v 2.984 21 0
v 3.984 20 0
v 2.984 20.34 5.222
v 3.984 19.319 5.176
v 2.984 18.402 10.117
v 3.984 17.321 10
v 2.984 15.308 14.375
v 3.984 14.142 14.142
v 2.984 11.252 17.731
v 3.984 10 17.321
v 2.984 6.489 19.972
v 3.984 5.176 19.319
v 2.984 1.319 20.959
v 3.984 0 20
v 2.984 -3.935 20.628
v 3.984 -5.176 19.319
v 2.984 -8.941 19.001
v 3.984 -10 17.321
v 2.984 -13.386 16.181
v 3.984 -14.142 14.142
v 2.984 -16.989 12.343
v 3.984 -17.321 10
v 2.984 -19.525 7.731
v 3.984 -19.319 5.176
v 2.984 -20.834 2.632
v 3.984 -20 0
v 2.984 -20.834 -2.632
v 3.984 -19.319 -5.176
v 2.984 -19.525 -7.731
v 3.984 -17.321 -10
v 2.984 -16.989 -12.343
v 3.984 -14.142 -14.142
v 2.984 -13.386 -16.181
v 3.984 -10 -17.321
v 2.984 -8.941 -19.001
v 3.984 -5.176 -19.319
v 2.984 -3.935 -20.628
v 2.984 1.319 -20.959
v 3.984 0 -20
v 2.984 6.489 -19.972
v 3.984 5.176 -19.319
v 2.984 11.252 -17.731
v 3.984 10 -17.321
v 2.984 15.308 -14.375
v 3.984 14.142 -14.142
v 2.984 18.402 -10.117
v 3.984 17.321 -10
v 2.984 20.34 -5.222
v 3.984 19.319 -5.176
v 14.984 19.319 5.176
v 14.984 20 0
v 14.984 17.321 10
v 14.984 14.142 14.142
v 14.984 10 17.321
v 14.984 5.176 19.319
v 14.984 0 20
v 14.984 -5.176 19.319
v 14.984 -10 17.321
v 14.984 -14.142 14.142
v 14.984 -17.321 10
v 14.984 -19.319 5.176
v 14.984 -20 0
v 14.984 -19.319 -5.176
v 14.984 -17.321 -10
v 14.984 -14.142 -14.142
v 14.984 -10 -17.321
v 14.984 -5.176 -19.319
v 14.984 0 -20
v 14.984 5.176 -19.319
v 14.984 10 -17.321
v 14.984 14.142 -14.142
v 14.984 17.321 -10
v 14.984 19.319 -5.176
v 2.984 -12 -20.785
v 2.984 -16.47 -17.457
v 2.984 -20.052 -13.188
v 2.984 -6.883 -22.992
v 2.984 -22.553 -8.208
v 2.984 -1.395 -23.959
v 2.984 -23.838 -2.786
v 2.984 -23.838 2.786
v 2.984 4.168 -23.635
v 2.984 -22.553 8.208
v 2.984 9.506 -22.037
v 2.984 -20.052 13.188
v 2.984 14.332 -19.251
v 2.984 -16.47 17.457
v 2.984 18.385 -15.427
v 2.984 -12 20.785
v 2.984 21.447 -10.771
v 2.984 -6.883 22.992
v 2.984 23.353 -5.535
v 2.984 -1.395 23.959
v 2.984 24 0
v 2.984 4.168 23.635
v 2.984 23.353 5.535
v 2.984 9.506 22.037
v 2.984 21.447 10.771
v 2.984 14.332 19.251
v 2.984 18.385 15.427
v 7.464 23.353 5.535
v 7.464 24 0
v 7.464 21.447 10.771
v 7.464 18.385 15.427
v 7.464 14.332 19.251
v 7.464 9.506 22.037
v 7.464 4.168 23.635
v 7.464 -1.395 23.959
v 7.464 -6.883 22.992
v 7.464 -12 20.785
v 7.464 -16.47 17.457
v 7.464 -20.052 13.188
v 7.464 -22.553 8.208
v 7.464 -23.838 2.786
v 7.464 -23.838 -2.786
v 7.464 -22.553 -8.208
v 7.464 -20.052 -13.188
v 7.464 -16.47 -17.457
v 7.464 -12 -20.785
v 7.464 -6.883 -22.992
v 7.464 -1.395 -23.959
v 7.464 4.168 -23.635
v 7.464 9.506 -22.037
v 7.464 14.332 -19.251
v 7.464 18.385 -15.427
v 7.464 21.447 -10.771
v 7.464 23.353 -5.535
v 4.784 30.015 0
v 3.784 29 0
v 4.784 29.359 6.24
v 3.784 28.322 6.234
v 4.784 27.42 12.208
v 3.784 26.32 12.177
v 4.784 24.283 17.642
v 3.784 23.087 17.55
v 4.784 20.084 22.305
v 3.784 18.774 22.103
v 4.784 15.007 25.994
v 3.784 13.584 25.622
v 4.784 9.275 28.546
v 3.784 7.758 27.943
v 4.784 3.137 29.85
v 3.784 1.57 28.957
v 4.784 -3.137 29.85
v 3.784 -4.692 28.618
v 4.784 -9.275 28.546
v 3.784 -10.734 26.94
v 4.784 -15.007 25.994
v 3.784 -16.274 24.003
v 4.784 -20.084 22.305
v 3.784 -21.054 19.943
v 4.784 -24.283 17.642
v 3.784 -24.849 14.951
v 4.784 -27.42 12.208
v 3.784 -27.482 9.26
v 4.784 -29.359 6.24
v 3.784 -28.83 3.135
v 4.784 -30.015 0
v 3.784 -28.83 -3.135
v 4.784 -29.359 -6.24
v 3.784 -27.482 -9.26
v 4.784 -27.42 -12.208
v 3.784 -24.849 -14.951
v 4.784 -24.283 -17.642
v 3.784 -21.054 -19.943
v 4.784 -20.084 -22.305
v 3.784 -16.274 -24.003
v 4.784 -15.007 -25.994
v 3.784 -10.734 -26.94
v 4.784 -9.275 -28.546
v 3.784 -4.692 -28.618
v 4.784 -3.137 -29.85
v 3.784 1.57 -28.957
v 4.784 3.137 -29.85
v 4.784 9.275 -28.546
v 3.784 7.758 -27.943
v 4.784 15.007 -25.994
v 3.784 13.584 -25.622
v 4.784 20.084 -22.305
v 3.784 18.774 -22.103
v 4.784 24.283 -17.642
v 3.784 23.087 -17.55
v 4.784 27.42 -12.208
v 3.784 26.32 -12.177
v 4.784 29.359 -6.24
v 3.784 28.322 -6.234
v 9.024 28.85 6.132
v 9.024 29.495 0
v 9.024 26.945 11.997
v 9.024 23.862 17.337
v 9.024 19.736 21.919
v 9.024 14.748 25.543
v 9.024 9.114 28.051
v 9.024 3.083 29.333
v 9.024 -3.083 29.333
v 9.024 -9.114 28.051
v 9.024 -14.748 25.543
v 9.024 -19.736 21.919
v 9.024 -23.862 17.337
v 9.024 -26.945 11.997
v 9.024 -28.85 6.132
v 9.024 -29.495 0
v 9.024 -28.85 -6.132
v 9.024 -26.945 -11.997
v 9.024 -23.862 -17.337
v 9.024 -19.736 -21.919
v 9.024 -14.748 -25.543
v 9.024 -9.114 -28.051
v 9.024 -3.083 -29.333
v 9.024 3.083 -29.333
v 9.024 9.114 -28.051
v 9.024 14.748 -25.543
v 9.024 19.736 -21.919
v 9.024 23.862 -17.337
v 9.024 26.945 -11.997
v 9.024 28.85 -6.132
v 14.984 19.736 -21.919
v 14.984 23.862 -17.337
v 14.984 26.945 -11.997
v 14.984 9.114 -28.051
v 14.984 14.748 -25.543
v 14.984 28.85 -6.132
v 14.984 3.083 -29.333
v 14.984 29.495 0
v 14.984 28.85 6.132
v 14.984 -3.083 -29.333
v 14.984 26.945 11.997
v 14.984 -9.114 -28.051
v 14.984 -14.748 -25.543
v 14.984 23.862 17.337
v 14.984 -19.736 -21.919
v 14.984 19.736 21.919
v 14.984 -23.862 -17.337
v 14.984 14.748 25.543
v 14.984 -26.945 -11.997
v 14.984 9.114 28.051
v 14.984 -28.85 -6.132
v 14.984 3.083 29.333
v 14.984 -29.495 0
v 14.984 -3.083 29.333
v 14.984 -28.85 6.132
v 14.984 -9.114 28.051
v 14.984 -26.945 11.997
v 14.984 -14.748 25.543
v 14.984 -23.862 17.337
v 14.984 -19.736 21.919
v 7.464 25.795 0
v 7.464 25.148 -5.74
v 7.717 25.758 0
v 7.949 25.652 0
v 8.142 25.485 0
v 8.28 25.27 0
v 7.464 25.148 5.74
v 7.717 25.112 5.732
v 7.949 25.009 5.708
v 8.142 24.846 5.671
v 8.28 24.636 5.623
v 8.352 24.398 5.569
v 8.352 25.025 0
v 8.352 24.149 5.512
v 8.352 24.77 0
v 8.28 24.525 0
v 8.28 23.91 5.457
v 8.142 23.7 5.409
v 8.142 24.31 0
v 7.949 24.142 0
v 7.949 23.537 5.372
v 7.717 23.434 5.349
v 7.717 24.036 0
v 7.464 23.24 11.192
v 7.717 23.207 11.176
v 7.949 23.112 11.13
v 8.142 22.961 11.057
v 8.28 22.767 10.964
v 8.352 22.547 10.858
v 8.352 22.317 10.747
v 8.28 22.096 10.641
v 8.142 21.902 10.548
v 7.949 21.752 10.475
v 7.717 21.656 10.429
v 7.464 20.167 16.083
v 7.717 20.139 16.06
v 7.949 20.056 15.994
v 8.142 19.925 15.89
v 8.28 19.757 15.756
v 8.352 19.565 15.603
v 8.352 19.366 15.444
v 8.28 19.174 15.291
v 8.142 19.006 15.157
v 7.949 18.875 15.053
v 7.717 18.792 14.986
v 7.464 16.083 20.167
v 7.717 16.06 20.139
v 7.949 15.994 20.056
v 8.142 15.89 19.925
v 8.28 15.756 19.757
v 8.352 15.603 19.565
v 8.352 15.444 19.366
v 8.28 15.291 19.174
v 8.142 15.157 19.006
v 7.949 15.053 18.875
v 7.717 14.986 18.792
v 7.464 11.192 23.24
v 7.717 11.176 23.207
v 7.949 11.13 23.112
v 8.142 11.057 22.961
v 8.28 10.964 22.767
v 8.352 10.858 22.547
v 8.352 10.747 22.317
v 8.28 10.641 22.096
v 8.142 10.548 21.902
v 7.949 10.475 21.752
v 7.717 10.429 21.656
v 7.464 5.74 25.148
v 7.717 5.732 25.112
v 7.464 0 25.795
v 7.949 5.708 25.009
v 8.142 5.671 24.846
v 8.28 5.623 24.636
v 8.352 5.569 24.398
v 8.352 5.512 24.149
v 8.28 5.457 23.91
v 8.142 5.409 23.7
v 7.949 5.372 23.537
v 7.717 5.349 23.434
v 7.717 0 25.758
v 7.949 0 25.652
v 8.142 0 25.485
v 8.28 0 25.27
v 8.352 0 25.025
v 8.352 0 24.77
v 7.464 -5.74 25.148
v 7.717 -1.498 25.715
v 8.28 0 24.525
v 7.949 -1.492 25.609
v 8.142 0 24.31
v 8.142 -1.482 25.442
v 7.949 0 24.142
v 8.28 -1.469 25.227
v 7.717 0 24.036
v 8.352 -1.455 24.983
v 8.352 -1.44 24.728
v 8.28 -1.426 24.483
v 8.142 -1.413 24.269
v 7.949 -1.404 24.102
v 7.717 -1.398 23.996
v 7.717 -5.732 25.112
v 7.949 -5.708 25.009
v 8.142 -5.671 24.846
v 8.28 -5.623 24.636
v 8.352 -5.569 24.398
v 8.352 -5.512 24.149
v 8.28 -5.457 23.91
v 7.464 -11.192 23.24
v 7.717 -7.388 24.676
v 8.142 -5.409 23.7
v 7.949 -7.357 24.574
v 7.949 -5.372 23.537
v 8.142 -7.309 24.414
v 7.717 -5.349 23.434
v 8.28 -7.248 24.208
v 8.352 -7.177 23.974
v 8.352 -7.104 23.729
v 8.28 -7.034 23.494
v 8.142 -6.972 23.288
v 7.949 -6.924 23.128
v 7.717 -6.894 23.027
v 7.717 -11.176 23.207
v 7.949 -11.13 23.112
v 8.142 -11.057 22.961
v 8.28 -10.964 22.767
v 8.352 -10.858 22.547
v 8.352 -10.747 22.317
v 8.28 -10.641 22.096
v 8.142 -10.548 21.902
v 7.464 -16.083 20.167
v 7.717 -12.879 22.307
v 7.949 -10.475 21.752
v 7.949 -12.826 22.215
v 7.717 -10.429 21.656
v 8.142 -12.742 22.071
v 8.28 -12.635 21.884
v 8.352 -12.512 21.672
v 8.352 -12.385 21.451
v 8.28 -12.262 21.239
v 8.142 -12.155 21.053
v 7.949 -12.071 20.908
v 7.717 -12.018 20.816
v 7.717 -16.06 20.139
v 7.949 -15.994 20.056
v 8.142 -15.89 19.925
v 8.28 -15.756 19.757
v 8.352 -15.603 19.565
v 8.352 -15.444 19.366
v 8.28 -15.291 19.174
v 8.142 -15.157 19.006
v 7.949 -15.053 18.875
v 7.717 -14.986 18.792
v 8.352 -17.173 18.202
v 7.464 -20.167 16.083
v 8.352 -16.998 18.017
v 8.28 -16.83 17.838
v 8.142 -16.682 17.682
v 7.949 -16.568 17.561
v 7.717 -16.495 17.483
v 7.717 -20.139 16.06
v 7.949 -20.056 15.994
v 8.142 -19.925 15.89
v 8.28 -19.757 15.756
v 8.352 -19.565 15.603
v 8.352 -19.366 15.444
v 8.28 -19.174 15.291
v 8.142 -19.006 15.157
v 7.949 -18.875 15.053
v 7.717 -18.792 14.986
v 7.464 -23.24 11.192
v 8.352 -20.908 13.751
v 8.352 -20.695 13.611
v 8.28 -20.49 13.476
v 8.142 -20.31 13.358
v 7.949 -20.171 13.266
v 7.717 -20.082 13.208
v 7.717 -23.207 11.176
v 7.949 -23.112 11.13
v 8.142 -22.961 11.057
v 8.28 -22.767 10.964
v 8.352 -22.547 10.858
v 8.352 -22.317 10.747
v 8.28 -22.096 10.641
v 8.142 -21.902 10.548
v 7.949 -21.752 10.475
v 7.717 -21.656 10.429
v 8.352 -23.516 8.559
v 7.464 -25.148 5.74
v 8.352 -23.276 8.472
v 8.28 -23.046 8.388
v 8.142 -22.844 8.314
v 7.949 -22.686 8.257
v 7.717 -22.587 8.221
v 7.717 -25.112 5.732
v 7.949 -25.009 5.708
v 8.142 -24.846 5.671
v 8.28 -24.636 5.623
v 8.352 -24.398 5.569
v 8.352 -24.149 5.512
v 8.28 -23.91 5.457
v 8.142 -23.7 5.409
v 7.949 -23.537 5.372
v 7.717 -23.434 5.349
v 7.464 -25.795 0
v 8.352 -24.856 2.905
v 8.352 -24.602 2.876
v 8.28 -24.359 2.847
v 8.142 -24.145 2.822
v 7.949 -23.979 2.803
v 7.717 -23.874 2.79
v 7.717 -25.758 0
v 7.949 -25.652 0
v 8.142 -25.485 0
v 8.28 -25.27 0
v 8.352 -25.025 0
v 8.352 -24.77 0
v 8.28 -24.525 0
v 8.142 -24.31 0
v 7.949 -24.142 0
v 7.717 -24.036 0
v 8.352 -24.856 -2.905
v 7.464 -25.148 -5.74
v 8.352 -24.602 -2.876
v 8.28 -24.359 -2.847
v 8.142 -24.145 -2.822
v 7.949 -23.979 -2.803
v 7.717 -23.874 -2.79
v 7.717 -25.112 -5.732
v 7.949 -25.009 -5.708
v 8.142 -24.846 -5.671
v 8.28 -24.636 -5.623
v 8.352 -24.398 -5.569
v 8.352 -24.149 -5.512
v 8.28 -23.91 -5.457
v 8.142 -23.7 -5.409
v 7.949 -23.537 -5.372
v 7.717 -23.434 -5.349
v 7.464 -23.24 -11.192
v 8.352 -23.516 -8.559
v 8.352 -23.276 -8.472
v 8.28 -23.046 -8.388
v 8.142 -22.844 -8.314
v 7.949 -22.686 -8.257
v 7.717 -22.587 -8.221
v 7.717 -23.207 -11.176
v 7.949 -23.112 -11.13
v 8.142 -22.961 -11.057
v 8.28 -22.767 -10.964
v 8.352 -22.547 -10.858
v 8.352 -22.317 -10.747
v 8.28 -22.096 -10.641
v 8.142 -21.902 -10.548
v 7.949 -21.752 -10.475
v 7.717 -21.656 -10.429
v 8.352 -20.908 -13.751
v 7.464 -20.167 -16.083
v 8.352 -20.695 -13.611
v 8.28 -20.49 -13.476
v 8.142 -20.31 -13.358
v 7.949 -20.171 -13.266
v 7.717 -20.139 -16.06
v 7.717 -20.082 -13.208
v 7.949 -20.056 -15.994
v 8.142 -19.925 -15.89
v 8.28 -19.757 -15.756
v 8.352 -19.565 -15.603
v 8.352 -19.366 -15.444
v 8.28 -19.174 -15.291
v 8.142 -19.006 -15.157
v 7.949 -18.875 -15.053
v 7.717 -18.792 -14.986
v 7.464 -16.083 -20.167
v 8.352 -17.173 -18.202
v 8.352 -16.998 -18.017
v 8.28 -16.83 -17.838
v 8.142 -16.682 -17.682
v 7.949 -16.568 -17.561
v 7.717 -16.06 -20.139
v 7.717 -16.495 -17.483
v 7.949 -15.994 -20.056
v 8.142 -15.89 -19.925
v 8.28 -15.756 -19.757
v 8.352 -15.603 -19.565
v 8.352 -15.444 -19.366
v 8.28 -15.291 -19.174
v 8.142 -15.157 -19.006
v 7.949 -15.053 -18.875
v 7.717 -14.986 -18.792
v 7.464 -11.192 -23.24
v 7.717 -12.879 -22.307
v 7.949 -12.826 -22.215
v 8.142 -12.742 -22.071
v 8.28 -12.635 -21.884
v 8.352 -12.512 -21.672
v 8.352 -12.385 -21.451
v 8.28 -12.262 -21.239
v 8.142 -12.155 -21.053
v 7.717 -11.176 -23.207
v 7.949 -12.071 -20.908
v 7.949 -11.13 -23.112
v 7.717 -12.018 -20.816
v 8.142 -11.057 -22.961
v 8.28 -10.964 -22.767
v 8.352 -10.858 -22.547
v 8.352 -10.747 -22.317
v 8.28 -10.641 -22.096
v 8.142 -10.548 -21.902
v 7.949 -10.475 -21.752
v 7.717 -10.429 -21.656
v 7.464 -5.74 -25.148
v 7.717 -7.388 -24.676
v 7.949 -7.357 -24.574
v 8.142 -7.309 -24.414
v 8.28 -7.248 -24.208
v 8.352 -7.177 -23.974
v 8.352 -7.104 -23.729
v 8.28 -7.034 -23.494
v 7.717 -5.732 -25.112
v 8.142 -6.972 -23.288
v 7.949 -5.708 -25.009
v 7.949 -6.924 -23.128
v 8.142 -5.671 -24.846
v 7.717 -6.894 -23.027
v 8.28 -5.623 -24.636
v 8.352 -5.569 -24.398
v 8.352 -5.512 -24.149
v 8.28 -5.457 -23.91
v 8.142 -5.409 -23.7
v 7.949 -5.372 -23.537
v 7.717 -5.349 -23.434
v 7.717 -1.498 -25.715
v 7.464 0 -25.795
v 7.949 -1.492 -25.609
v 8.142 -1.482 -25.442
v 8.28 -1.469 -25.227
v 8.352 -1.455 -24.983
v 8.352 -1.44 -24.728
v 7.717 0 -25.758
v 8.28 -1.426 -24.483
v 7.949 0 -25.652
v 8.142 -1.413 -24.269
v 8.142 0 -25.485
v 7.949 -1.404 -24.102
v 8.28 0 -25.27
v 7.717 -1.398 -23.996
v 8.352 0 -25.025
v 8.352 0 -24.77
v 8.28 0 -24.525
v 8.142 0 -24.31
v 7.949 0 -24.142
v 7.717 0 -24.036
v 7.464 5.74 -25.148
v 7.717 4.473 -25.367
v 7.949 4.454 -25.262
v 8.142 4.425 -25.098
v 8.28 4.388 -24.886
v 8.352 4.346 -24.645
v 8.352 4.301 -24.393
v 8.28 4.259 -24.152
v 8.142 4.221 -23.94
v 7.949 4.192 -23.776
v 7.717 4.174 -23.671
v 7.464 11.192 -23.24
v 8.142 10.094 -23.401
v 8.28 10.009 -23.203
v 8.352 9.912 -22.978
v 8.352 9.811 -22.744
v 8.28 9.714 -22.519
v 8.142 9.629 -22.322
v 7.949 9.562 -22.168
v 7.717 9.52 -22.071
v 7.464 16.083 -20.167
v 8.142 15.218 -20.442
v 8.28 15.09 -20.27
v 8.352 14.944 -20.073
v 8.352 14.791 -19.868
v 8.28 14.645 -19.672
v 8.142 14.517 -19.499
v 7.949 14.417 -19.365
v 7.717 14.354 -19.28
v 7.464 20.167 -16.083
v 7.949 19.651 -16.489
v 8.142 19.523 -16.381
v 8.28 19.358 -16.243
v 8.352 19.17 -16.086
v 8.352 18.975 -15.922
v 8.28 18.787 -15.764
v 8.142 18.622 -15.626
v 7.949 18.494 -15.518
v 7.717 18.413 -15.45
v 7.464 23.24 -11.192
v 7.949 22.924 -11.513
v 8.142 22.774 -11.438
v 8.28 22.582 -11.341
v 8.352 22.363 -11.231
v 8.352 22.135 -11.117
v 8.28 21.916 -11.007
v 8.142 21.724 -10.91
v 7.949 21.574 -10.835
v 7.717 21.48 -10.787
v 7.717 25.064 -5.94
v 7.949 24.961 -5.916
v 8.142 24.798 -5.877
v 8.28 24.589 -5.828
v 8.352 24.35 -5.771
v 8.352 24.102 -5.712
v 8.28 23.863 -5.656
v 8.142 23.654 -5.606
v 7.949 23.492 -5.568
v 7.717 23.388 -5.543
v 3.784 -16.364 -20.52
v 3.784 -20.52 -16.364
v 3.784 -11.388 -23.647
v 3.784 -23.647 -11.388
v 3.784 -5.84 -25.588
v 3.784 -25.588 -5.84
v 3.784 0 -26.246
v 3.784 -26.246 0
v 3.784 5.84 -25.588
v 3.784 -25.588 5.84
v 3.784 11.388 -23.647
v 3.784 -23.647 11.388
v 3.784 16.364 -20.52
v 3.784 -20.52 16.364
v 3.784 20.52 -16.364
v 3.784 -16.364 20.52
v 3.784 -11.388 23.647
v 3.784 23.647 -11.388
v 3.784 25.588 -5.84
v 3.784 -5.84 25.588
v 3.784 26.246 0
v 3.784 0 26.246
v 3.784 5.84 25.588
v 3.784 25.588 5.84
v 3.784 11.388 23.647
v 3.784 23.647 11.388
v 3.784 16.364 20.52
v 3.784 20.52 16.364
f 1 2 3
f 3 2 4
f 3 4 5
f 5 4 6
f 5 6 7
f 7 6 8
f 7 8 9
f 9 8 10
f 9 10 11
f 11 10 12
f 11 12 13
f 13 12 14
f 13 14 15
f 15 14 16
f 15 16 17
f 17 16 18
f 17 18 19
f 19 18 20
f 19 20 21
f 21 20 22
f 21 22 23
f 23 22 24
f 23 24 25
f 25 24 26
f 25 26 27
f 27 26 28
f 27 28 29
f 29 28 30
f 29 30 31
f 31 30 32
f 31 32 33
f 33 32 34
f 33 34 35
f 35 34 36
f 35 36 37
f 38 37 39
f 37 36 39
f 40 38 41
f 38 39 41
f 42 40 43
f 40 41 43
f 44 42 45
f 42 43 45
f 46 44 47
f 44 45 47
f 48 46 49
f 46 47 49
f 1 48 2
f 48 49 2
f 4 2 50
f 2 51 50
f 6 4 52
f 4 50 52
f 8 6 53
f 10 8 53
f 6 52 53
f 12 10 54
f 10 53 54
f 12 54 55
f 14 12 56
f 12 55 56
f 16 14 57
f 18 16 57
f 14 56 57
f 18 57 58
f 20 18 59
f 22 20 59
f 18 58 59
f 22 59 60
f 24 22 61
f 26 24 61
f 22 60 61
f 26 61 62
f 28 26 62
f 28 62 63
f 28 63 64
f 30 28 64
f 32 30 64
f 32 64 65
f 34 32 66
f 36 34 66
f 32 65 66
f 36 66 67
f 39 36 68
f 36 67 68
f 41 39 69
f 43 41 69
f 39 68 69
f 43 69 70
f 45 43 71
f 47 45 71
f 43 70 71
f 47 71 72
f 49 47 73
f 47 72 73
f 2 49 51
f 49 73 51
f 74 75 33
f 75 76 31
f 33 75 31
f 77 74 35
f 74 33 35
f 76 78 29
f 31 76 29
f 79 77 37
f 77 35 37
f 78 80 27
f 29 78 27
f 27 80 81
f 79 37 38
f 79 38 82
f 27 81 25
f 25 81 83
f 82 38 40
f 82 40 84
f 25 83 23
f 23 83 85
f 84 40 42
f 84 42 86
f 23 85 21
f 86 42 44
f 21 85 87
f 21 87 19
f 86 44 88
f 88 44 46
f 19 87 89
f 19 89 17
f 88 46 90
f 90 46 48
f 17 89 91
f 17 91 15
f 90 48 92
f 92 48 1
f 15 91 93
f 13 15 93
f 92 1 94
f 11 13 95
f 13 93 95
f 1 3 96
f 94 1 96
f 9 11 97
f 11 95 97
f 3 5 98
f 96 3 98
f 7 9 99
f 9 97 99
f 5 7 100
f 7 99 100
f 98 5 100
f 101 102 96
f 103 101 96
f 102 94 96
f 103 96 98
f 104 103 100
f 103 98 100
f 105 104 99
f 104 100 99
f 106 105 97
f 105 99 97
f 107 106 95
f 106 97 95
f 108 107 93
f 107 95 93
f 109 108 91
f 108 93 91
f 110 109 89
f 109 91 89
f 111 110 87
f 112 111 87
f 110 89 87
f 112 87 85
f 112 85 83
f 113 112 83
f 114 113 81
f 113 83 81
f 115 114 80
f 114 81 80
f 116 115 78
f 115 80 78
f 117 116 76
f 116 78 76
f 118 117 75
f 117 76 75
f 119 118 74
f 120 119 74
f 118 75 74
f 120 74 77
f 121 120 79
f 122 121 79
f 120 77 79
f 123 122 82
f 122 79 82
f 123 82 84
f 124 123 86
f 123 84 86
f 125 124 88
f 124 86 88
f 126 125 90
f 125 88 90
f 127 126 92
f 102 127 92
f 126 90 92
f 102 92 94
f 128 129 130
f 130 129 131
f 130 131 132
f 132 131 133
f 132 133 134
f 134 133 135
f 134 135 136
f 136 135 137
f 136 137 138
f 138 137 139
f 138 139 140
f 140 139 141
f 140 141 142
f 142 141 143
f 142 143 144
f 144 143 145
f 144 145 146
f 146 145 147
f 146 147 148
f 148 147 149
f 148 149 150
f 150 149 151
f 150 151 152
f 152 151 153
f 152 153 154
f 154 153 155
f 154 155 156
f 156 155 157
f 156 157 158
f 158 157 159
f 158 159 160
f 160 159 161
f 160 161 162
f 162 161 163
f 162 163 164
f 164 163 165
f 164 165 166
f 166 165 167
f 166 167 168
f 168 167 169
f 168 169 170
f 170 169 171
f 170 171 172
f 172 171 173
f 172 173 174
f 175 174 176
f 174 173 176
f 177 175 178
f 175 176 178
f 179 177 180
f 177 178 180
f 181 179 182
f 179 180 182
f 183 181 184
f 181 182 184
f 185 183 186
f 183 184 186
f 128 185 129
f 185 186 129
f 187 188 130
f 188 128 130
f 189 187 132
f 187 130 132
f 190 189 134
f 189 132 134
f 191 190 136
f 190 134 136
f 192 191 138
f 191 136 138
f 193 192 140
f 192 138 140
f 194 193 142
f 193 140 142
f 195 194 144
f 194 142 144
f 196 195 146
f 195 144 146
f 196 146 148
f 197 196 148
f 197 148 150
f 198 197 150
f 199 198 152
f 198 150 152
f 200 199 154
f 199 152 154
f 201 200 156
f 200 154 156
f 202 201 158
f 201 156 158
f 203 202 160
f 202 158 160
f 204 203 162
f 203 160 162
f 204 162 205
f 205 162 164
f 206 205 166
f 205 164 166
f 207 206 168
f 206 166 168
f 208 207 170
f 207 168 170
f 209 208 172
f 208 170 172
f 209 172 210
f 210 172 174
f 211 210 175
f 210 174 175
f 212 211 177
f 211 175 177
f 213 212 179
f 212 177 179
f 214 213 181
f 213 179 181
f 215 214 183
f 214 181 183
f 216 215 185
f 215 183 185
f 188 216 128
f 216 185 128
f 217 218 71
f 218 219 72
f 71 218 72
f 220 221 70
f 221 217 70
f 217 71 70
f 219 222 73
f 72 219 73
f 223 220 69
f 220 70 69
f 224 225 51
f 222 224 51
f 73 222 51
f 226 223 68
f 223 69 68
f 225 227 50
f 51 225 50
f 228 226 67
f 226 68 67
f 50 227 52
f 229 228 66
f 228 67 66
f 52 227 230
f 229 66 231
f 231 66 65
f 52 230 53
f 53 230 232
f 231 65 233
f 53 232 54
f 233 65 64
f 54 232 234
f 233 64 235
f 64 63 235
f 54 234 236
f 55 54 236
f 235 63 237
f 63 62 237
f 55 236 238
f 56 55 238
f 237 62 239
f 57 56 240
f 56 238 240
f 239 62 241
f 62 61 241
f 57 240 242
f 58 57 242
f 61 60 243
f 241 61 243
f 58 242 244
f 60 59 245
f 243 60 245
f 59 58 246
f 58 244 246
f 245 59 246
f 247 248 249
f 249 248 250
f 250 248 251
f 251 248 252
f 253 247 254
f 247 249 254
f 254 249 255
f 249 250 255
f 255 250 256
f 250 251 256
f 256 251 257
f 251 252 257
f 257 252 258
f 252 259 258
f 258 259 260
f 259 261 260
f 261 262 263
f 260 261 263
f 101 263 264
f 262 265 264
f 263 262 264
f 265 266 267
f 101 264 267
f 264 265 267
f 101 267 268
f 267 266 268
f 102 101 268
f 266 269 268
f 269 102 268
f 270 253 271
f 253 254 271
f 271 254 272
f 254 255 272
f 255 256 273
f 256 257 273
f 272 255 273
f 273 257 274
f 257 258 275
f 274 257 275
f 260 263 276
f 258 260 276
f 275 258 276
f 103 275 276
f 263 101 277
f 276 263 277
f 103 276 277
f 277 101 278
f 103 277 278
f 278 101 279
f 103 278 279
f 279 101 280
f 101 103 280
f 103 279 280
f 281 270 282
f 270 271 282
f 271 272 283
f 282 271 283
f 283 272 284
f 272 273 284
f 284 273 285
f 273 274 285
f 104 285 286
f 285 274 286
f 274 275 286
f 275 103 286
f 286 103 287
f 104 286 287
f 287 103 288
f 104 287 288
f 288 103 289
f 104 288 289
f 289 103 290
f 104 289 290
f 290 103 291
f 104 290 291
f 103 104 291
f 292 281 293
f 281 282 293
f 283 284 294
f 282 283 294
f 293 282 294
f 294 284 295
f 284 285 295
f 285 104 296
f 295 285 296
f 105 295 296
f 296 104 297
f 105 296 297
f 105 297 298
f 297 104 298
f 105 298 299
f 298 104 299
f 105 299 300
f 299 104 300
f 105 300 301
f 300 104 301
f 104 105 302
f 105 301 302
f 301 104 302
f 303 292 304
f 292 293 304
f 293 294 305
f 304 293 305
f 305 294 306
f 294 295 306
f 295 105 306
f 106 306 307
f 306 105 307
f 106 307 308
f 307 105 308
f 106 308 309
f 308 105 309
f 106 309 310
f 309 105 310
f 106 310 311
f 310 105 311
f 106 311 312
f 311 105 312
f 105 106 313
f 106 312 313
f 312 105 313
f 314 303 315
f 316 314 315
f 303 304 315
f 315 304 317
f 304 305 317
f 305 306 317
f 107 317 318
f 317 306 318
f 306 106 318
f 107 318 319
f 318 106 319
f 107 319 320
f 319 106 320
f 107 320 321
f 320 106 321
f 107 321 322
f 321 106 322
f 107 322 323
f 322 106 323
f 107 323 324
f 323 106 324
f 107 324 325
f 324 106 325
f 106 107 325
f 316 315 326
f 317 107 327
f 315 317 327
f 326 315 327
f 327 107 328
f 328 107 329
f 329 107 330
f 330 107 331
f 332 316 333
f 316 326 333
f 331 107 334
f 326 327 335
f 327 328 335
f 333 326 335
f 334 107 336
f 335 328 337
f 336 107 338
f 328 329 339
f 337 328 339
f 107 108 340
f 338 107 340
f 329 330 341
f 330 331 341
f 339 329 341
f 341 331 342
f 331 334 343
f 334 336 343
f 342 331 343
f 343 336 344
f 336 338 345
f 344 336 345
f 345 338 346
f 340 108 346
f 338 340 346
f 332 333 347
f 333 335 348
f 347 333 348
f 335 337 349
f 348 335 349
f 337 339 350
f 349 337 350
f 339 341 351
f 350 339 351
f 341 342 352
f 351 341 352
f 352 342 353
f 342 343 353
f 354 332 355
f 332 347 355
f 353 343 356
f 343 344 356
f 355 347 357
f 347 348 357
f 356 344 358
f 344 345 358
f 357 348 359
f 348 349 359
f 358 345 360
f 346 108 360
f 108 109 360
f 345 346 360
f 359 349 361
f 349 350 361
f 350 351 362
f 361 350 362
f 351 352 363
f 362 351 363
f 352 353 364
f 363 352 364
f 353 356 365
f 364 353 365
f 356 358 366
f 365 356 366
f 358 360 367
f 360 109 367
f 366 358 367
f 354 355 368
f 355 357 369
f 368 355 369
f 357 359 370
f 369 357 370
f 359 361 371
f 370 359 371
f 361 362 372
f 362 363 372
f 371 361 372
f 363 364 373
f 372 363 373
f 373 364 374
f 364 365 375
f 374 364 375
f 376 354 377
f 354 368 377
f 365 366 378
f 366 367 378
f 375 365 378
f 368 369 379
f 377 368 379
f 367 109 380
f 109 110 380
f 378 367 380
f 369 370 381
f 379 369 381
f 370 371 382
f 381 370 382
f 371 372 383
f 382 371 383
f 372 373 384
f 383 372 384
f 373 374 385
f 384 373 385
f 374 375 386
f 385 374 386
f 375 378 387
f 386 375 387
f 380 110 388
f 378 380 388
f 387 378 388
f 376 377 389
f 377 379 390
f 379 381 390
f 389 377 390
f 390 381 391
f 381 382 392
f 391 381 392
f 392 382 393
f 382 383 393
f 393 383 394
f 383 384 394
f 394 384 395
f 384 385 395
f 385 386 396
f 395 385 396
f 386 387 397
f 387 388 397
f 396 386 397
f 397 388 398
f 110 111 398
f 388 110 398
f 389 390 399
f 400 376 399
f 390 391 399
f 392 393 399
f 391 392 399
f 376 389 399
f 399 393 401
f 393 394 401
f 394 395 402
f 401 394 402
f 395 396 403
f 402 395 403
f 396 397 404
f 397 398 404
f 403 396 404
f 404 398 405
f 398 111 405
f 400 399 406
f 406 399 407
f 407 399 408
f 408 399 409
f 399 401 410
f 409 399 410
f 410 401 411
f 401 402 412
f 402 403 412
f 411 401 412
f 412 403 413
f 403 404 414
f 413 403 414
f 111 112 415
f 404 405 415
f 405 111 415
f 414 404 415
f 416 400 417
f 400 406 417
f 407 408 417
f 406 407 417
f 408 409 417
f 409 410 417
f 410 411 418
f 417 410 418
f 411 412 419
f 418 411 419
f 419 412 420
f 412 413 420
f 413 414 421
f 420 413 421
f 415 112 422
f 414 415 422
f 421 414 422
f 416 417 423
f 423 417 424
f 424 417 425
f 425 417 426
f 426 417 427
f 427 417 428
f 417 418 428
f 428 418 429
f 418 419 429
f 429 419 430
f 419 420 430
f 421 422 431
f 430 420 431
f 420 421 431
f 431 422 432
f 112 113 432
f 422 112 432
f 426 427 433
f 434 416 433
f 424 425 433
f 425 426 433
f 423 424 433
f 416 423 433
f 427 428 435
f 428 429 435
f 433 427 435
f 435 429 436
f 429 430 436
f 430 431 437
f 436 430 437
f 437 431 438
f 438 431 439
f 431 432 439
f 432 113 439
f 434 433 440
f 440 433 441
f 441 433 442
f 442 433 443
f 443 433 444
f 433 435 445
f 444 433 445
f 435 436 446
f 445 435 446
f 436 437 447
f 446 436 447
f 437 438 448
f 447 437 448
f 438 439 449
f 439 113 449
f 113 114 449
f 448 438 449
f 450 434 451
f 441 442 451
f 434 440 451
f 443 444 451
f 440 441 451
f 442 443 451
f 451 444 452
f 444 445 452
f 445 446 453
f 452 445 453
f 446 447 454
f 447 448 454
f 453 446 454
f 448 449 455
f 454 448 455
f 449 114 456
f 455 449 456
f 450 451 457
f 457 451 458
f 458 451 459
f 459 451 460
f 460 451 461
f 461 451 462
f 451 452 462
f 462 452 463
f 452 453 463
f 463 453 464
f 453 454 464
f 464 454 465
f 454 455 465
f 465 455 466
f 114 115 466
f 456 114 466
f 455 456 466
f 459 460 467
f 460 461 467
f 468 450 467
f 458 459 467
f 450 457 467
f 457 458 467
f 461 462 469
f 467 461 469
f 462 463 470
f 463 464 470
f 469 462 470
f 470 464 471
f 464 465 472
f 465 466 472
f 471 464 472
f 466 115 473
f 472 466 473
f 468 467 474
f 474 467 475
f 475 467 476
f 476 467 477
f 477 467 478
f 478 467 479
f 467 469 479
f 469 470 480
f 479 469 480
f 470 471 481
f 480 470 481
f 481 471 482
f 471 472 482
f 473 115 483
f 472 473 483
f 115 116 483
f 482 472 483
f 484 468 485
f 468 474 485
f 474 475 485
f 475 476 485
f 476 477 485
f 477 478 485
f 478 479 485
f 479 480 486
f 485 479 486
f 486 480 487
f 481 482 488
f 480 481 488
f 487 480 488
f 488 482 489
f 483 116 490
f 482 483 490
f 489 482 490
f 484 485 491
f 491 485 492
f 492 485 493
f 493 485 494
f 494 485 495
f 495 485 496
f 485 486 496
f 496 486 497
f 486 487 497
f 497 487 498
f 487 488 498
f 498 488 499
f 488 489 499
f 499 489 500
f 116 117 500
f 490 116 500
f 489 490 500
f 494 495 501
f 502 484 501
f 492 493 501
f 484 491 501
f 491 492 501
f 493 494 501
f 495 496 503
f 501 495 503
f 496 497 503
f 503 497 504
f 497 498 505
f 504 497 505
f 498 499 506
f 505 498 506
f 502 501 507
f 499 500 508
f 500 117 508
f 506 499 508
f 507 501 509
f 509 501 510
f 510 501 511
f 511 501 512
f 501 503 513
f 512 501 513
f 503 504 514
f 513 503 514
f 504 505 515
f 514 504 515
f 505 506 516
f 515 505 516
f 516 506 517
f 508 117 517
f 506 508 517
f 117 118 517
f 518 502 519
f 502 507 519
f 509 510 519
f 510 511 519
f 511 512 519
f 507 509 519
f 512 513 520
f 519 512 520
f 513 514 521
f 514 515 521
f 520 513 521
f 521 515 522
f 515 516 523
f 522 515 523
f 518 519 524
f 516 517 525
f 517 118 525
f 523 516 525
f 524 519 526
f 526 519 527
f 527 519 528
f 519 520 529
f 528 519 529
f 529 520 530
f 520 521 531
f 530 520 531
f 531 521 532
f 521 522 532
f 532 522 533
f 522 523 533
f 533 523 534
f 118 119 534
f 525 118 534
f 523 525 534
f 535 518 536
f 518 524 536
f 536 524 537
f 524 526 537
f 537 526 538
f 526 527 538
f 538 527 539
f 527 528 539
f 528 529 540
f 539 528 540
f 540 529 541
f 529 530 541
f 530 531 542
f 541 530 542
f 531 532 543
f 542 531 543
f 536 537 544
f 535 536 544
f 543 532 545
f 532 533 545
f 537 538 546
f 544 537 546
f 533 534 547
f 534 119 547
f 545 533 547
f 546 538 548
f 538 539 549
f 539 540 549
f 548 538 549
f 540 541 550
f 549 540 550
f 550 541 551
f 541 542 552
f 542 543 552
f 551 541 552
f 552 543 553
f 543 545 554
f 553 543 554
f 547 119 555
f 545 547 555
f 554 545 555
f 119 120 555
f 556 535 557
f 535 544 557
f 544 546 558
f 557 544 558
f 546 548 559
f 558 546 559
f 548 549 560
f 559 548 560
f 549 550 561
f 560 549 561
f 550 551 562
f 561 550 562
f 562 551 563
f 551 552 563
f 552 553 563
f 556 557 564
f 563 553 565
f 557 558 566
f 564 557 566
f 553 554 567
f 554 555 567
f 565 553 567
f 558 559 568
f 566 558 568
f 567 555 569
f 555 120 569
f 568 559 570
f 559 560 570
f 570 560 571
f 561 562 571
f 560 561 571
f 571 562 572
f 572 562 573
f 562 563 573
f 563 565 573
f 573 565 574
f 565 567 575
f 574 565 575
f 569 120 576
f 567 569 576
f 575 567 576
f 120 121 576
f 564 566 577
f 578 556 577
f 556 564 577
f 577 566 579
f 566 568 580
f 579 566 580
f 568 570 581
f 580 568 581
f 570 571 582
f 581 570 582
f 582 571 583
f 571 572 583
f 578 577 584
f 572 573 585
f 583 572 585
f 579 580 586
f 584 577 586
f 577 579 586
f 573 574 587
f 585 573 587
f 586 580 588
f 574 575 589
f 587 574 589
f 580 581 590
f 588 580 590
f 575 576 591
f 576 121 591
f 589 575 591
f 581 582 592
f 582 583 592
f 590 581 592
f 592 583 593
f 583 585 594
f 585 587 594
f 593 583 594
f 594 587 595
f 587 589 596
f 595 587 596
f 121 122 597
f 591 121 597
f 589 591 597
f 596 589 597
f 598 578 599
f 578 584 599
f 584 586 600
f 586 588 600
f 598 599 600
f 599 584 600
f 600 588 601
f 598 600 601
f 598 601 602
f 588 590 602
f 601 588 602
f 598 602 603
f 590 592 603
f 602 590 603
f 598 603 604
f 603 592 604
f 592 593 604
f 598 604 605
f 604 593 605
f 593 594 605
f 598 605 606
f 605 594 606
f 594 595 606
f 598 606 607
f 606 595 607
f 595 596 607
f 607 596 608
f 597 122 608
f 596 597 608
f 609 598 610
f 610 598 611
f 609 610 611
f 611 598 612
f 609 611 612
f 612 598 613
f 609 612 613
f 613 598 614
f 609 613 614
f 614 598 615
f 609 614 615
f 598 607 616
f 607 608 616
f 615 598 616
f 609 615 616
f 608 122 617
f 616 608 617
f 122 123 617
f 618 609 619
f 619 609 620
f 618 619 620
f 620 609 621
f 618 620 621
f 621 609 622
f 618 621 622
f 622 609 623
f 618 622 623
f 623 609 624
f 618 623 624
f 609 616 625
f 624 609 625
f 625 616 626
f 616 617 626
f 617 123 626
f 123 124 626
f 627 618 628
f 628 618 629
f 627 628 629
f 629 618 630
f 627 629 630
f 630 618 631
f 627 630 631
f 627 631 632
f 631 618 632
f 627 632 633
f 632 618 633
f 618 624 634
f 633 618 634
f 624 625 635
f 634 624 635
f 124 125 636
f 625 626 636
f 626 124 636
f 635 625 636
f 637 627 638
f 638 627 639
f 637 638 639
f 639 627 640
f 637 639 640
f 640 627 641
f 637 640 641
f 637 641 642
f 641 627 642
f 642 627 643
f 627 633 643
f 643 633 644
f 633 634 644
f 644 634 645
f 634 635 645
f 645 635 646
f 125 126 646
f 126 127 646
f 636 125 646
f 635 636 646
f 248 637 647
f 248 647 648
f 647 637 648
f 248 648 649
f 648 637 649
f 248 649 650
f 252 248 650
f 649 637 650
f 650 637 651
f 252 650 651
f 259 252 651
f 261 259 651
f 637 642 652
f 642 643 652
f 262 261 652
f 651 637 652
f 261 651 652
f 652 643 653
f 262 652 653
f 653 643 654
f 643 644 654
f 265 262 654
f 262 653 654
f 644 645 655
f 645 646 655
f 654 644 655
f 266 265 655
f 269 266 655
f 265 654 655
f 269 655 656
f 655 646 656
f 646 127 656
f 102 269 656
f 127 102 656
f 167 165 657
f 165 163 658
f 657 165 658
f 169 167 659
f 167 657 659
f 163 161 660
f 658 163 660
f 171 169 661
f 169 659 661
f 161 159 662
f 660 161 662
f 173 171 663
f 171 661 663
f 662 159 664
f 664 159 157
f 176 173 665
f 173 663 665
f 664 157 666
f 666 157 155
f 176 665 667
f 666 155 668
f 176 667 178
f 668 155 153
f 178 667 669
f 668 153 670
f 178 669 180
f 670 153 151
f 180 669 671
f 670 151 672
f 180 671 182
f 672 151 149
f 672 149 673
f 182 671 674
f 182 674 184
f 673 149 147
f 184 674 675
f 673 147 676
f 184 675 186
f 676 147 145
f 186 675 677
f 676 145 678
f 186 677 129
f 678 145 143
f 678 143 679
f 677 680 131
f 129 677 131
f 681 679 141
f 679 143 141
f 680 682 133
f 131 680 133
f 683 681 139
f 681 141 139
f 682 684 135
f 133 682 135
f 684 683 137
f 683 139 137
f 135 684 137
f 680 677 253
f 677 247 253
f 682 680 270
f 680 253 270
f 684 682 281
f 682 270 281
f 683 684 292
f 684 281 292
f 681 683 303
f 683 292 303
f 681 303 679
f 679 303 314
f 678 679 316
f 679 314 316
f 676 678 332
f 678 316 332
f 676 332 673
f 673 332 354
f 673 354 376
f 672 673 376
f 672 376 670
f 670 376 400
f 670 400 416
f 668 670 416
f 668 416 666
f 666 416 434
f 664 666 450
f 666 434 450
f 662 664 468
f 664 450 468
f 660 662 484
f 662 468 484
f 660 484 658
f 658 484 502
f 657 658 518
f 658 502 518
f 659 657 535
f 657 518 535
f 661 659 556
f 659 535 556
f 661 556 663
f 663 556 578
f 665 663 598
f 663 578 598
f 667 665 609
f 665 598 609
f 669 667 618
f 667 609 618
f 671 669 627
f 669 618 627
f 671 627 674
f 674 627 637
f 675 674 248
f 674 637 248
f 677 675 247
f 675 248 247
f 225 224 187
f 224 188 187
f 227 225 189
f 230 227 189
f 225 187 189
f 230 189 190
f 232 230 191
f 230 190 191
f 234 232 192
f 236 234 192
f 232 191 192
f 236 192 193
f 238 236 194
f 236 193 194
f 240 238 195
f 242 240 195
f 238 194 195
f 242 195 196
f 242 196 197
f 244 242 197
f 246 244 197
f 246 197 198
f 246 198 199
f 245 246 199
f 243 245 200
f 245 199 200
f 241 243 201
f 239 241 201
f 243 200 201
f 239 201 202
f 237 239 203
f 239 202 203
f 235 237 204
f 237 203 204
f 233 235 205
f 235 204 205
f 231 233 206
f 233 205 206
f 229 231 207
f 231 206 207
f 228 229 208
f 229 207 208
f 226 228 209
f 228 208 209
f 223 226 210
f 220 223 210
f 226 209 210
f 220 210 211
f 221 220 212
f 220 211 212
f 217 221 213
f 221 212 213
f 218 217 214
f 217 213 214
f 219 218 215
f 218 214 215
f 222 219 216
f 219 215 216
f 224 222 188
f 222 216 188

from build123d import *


with BuildPart() as part:
    # Sketch1 → Revolve1 (revolve)
    with BuildSketch(Plane.XY):
        with BuildLine():
            Line((2.983876441, 24), (2.983876441, 21))
            Line((2.983876441, 21), (3.983876441, 20))
            Line((3.983876441, 20), (14.983876441, 20))
            Line((14.983876441, 20), (14.983876441, 29.495))
            Line((14.983876441, 29.495), (9.023876441, 29.495))
            Line((9.023876441, 29.495), (4.783876441, 30.014855378))
            Line((4.783876441, 30.014855378), (3.783876441, 29))
            Line((3.783876441, 29), (3.783876441, 26.245704095))
            Line((3.783876441, 26.245704095), (7.463876441, 25.794508861))
            ThreePointArc((7.463876441, 25.794508861), (8.361130872, 24.89725443), (7.463876441, 24))
            Line((7.463876441, 24), (2.983876441, 24))
        make_face()
    revolve(axis=Axis((0, 0, 0), (1, 0, 0)))


solid = part.part
